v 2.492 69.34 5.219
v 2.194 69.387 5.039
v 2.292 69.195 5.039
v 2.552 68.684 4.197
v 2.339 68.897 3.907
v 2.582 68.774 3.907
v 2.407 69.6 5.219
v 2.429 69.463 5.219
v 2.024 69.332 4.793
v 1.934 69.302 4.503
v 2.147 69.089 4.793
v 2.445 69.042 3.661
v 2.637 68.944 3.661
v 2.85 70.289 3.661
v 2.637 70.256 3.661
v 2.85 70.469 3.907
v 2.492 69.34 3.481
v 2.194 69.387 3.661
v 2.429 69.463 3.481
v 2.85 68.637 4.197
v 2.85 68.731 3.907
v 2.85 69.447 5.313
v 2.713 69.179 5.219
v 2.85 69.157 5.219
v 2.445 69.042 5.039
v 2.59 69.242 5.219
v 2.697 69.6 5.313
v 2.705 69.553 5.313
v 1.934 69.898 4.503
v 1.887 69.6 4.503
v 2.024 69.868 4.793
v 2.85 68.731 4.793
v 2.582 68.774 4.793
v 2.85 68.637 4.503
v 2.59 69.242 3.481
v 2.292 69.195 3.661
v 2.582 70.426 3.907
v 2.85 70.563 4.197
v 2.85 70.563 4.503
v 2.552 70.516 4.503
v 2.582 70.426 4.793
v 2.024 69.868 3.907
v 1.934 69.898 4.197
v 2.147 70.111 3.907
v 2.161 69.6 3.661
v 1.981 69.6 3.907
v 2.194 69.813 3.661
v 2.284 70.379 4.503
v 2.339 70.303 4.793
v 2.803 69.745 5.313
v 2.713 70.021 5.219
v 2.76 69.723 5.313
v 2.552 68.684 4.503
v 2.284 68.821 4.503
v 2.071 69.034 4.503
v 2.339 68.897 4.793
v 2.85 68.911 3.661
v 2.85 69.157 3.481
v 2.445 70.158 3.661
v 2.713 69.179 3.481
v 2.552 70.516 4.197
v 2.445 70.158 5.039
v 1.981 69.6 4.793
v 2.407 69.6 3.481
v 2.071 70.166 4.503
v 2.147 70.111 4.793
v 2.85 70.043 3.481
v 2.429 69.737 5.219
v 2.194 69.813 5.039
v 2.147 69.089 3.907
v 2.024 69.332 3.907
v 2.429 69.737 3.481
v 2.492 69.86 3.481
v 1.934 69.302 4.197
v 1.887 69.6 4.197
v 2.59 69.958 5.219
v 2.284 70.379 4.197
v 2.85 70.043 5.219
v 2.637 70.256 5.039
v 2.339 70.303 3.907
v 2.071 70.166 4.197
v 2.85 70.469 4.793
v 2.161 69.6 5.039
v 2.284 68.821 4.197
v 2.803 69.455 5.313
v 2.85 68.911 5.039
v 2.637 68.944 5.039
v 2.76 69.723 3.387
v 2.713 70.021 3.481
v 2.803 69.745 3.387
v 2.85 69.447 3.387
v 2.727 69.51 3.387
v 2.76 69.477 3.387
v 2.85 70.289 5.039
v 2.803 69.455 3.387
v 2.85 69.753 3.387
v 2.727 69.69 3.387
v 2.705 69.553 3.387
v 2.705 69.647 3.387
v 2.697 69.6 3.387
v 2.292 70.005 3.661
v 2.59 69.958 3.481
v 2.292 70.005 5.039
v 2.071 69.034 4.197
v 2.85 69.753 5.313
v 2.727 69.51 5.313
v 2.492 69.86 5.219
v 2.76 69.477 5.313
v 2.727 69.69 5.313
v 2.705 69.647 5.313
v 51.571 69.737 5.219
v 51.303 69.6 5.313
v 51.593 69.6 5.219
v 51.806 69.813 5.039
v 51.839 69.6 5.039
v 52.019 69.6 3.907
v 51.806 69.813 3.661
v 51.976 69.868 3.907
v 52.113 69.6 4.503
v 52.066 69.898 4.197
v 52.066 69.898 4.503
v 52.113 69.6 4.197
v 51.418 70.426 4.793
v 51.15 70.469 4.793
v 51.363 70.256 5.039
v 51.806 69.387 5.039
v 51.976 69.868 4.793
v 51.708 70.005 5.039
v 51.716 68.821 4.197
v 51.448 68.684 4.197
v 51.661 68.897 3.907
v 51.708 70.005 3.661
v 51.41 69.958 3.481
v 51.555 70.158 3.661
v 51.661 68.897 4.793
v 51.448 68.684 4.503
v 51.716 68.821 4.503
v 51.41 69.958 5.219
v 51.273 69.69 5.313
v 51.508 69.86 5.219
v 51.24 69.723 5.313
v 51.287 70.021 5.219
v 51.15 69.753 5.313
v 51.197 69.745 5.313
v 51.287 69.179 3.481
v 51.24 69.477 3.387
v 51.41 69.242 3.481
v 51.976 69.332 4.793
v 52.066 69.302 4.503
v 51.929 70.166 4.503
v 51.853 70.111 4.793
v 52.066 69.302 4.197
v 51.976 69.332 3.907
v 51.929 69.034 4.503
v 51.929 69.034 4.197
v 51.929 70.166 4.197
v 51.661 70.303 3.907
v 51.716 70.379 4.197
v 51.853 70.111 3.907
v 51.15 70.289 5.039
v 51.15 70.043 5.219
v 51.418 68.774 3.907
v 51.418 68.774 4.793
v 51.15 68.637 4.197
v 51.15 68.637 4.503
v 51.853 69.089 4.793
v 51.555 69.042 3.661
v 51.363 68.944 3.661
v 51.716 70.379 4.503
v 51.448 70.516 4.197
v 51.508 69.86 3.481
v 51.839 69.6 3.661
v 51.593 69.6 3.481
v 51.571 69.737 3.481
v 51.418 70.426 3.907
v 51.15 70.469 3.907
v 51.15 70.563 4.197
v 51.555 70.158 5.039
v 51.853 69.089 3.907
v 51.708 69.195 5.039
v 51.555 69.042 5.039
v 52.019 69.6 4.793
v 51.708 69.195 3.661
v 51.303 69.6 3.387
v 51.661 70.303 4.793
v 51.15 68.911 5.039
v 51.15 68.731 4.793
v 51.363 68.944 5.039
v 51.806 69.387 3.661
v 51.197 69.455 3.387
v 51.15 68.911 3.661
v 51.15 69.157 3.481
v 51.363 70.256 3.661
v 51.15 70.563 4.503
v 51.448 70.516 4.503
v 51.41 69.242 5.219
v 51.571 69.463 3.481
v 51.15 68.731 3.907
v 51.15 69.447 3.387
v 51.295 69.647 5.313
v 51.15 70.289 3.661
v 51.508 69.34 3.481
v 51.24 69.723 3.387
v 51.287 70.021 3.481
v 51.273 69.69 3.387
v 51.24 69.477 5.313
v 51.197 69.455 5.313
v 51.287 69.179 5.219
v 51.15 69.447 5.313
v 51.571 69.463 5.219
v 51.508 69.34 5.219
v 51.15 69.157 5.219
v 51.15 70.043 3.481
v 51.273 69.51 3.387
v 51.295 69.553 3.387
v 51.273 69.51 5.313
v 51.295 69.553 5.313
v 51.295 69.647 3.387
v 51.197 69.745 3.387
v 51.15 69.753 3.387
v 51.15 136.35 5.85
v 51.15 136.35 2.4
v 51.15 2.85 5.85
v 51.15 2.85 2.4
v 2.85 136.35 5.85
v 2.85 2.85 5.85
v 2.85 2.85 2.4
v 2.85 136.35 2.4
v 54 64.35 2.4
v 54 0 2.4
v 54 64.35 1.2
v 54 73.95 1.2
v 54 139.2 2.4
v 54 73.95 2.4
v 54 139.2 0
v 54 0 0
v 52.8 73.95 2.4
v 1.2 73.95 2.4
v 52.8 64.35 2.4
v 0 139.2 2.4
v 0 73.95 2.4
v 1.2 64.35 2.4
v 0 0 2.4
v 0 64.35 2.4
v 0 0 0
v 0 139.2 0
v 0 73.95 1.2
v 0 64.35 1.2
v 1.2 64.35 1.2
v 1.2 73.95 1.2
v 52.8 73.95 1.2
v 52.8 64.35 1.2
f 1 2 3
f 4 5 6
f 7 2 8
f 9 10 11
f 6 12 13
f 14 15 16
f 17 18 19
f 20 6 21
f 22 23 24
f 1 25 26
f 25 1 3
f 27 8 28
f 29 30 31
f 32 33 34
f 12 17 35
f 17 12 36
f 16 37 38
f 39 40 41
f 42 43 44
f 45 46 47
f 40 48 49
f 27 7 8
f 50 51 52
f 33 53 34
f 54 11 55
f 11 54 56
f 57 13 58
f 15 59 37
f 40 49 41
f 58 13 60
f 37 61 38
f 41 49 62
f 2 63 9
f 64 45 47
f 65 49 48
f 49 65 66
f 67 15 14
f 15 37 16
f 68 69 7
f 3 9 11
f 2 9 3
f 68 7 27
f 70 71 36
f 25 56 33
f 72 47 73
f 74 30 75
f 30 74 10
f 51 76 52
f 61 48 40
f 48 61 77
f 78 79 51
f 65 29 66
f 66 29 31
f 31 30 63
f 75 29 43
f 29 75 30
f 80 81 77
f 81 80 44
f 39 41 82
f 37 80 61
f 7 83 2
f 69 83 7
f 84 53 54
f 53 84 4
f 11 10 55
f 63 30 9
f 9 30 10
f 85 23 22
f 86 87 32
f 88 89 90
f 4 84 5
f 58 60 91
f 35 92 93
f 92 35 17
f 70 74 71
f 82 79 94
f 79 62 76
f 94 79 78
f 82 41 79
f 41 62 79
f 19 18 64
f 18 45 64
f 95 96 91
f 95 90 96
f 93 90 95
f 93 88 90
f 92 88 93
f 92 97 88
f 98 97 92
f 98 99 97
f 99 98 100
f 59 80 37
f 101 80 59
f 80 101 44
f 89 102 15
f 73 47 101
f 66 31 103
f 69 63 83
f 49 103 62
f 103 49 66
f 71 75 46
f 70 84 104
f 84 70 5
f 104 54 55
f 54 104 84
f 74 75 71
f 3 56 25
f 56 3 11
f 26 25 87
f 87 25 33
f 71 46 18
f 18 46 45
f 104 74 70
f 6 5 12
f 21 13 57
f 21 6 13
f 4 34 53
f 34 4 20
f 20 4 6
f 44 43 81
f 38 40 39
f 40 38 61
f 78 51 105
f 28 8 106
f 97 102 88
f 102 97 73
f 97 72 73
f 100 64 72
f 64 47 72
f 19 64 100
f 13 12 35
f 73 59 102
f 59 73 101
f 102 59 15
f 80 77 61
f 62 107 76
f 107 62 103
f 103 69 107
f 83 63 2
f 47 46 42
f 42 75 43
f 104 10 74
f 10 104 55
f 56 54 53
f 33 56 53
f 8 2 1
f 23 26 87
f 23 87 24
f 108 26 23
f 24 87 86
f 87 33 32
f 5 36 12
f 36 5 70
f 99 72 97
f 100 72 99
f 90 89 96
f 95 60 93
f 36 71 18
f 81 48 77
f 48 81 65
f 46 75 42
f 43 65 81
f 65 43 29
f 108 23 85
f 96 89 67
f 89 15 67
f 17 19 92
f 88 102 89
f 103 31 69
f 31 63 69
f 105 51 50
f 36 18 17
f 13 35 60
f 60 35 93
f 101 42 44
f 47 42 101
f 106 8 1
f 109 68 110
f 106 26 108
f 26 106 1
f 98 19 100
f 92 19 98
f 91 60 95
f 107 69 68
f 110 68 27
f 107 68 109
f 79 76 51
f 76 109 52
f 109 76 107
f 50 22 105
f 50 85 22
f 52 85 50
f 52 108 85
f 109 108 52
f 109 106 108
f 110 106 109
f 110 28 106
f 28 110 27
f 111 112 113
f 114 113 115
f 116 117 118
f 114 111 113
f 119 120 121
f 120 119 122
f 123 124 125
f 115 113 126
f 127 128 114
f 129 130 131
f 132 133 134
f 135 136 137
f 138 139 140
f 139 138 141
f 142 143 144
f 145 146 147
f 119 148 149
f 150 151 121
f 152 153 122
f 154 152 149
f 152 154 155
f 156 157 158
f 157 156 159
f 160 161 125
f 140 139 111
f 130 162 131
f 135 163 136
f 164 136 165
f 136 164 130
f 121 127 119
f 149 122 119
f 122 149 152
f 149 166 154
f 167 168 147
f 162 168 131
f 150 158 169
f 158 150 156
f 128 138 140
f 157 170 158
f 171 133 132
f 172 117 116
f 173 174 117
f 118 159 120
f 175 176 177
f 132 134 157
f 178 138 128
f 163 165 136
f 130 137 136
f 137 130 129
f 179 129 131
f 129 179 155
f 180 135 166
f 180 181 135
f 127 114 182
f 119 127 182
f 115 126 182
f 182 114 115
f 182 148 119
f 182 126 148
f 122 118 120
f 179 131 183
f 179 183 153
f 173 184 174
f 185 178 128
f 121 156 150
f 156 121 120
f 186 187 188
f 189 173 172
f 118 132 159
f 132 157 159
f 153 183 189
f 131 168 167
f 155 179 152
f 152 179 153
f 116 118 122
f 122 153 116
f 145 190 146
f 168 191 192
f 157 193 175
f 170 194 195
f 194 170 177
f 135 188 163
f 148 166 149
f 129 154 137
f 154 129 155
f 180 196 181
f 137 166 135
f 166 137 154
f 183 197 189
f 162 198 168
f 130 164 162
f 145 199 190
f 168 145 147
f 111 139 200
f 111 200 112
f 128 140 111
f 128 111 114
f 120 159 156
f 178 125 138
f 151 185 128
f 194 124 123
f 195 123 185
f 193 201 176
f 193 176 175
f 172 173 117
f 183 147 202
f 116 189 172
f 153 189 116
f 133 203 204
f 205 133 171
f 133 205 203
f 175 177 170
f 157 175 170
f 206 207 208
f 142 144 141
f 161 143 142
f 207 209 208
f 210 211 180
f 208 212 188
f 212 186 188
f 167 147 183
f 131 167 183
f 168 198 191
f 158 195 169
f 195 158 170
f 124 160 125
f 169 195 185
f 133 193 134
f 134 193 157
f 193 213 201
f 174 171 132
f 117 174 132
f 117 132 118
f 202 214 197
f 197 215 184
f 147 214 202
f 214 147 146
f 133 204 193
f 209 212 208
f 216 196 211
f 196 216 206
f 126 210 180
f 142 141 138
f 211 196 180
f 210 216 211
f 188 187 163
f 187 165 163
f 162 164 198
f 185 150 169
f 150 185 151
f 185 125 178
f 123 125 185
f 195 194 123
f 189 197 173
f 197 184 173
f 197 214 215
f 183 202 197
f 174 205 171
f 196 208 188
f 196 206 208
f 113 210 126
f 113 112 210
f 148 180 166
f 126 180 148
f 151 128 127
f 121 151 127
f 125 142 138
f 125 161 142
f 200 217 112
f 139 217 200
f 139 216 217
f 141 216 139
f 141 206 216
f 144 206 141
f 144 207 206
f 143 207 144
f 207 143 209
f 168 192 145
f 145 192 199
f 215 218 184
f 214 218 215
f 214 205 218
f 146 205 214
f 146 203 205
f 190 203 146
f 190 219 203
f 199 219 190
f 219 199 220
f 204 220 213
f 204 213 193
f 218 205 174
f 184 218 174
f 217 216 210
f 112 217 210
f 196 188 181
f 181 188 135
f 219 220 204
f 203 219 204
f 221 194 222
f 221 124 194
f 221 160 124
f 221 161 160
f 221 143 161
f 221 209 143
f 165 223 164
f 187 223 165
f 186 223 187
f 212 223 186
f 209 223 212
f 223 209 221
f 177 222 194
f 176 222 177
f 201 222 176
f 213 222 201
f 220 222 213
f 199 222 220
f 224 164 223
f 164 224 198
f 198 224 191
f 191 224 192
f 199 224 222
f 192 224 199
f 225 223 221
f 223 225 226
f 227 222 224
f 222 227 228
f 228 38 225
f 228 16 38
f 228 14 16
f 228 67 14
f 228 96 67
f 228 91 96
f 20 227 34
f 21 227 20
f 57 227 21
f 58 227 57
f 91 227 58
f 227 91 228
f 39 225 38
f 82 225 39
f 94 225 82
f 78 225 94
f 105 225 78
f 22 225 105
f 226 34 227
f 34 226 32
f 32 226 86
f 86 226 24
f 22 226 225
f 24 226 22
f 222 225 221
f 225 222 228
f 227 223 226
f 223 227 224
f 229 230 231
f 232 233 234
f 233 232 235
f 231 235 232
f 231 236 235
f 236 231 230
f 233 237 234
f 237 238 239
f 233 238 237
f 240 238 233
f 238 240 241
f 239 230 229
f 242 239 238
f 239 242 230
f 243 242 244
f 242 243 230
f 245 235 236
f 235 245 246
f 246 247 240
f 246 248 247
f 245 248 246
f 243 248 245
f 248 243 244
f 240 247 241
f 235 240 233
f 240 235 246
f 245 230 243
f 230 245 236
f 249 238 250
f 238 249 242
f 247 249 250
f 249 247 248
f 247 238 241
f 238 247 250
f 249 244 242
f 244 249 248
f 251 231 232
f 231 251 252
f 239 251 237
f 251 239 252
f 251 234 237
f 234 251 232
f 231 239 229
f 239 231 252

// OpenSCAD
// file: ../Modules/Box/hollow.scad
/**
 * Dibuja un hueco en una caja con las dimensiones especificadas.
 * Si las dimensiones necesitadas son las externas, se debe restar el borde.
 *
 * @param {Number} width     Ancho del hueco (eje X).
 * @param {Number} length    Largo del hueco (eje Y).
 * @param {Number} height    Alto del hueco (eje Z).
 * @param {Number} thickness Grosor del borde.
 *
 * @author  Joaquín Fernández
 * @url     https://gitlab.com/joaquinfq/openscad/blob/master/Modules/Box/hollow.scad
 * @license CC-BY-NC-4.0
 */
module boxHollow(width, length, height, thickness = 1)
{
    if (thickness > 0)
    {
        _b = 2 * thickness;
        difference()
        {
            cube([ width  + _b, length + _b, height + thickness ]);
            translate([ thickness, thickness, thickness ])
            {
                cube([ width, length, height ]);
            }
        }
    }
}
// file: ../Functions/ceilMultiple.scad
/**
 * Aproxima el valor especificado al múltiplo superior
 * más cercano del valor de referencia.
 * Su principal uso es aproximar por exceso un valor a
 * un `layerHeight` superior para dejar margen.
 *
 * @param value Valor a aproximar.
 * @param ref   Valor a usar como referencia.
 *
 * @author  Joaquín Fernández
 * @license CC-BY-NC-4.0
 * @url     https://gitlab.com/joaquinfq/openscad/blob/master/Functions/ceilMultiple.scad
 */
function ceilMultiple(value, ref) = ceil(value / ref) * ref;
// file: ../Functions/flatten.scad
/**
 * Devuelve un array con cada uno de los elementos de
 * un subarray según el índice especificado.
 *
 * Ejemplo:
 *
 * in = [ [ 0, 1 ], [ 2, 3 ] ];
 * echo(flatten(in, 0)); // [ 0, 2 ]
 * echo(flatten(in, 1)); // [ 1, 3 ]
 *
 * @param {Array}  array Array multidimensional a usar para obtener los valores.
 * @param {Number} column Columna de los subarray para extraer sus valores.
 * @param {Number} row    Fila del array siendo procesada.
 * @param {Array}  output Acumulador donde se van metiendo los valores.
 *                        Si se pasa algún valor, se concatenan al resultado.
 *
 * @author  Joaquín Fernández
 * @license CC-BY-NC-4.0
 * @url     https://gitlab.com/joaquinfq/openscad/blob/master/Functions/flatten.scad
 */
function flatten(array, column = 0, row = 0, output = []) = row > 0
    ? flatten(array, column, row - 1, concat(output, [ array[row][column] ]))
    : concat(output, [ array[row][column] ]);
// main file
/**
 * Dibuja una caja para guardar brocas.
 * Modificando los valores de la variable `sizes` se puede incluso
 * usar para guardar otros tipos de elementos tales como lápices,
 * bolígrafos, pinceles, etc..
 *
 * @author  Joaquín Fernández
 * @url     https://gitlab.com/joaquinfq/openscad/blob/master/Tools/DrillHolder.scad
 * @license CC-BY-NC-4.0
 */
use <../Functions/flatten.scad>
use <../Functions/ceilMultiple.scad>
use <../Modules/Box/hollow.scad>
//-----------------------------------------------------------------------
// Valores personalizables
//-----------------------------------------------------------------------
// Valor del "layer height"
// El grosor de las paredes se calcula en función a este valor.
lh = 0.3;
// Indica si se agrega la muesca para sacar las brocas más fácilmente.
cut = true;
// Indica si se muestra la tapa o la caja.
showBox = 0;
// Dimensiones de las brocas: [0]: Diámetro, [1]: Largo
// Si se quiere holgura, tomar en cuenta a la hora de asignar los valores.
// Se pueden poner en cualquier orden pero si se ponen de mayor a menor
// se aprovecha el espacio que queda para guardar tornillos, puntas, etc.
sizes = [
    [ 10, 133 ],
    [  8, 117 ],
    [  6,  93 ],
    [  5,  86 ],
    [  4,  74 ],
    [  3,  61 ]
];
//-----------------------------------------------------------------------
// Fin de la personalización.
//-----------------------------------------------------------------------
function offsetX(i, total = 0, thickness = 0) = i > 0
    ? offsetX(i - 1, total + sizes[i - 1][0] + thickness + d, thickness)
    : total + thickness;

function flatSizes(idx = 0, i = len(sizes) - 1, arr = []) = flatten(sizes, idx, i, arr);

// Grosor de las paredes.
b  = ceilMultiple(1.2, lh);
// Altura de la parte de la tapa que entra en la caja
ci = ceilMultiple(3.75, lh);
// Valor a usar como holgura.
// Esto permite poner las medidas absolutas sin estar pendiente 
// de sumarle un pequeño espacio para que la broca entre fácil.
d  = 4 * lh;
// Cantidad de elementos
n  = len(sizes);
// Altura interna de la caja (eje Z)
h  = ceilMultiple(max(flatSizes(0)) + d + ci, lh);
// Largo interno de la caja (eje Y)
l  = ceilMultiple(max(flatSizes(1)) + d, lh);
// Anchura interna de la caja (eje X)
w  = offsetX(n, 0, b) - 2 * b;
//-----------------------------------------------------------------------
// Inicio
//-----------------------------------------------------------------------
module box(w, l, h, b)
{
    _2b = 2 * b;
    difference()
    {
        difference()
        {
            union()
            {
                boxHollow(w, l, h, _2b);
                for (i = [ 0 : n - 1 ])
                {
                    translate([ offsetX(i, 0, b), b, 0 ])
                    {
                        boxHollow(
                            ceilMultiple(sizes[i][0] + d,lh),
                            ceilMultiple(sizes[i][1] + d, lh),
                            h,
                            b
                        );
                    }
                }
            }
            if (cut)
            {
                // Hacemos una muesca para sacar las brocas fácilmente.
                // La altura de las pestaña que queda es la mitad 
                // de la broca más fina.
                dy = min(flatSizes(1));
                translate([ _2b, dy / 4, _2b + min(flatSizes(0)) / 2 ])
                {
                    cube([ w - b, dy / 2, h ]);
                }
            }
        }
        // Colocamos la tapa para sacar la muesca de cierre.
        _h = h + 2 * _2b;
        _l = l + 2 * _2b;
        _w = w + 2 * _2b;
        translate([ _w, 0, _h ])
        {
            rotate([ 0, 180, 0 ])
            {
                cover(_w, _l, _2b, _2b);
            }
        }
    }
}
module cover(w, l, h, b, t = 0, hi = ci)
{
    _b = b + t;
    _d = b - t;
    _l = l - _b * 2;
    _w = w - _b * 2;
    difference()
    {
        union()
        {
            // Bloque externo
            cube([ w, l, h ]);
            translate([ _b, _b, h ])
            {
                // Bloque interno
                cube([ _w, _l, hi - t ]);
                translate([ 0, 0, (hi - t) / 2 ])
                {
                    for (i = [ 0, 1 ])
                    {
                        // Pestañas lado corto
                        //translate([ _w / 2, i * _l, t / 2 ])
                        //{
                        //    sphere(d = _d, center = true, $fn = 20);
                        //}
                        // Pestañas lado largo
                        translate([ i * _w, _l / 2, t / 2 ])
                        {
                            sphere(d = _d, center = true, $fn = 20);
                        }
                    }
                }
            }
        }
        for (i = [ 0, 1 ])
        {
            // Muescas lado corto
            //translate([ _w / 2 - b, i * (l - b / 2), b / 2 ])
            //{
            //    cube([ 4 * b, b / 2, 10 ]);
            //}
            // Muescas lado largo
            translate([ i * (w - b / 2), _l / 2 - b, b / 2 ])
            {
                cube([ b / 2, 4 * b, b ]);
            }
        }
    }
}
if (showBox)
{
    box(w, l, h, b);
}
else
{
    cover(
        w + 4 * b,
        l + 4 * b,
        2 * b,
        2 * b,
        1.5 * lh
    );
}
